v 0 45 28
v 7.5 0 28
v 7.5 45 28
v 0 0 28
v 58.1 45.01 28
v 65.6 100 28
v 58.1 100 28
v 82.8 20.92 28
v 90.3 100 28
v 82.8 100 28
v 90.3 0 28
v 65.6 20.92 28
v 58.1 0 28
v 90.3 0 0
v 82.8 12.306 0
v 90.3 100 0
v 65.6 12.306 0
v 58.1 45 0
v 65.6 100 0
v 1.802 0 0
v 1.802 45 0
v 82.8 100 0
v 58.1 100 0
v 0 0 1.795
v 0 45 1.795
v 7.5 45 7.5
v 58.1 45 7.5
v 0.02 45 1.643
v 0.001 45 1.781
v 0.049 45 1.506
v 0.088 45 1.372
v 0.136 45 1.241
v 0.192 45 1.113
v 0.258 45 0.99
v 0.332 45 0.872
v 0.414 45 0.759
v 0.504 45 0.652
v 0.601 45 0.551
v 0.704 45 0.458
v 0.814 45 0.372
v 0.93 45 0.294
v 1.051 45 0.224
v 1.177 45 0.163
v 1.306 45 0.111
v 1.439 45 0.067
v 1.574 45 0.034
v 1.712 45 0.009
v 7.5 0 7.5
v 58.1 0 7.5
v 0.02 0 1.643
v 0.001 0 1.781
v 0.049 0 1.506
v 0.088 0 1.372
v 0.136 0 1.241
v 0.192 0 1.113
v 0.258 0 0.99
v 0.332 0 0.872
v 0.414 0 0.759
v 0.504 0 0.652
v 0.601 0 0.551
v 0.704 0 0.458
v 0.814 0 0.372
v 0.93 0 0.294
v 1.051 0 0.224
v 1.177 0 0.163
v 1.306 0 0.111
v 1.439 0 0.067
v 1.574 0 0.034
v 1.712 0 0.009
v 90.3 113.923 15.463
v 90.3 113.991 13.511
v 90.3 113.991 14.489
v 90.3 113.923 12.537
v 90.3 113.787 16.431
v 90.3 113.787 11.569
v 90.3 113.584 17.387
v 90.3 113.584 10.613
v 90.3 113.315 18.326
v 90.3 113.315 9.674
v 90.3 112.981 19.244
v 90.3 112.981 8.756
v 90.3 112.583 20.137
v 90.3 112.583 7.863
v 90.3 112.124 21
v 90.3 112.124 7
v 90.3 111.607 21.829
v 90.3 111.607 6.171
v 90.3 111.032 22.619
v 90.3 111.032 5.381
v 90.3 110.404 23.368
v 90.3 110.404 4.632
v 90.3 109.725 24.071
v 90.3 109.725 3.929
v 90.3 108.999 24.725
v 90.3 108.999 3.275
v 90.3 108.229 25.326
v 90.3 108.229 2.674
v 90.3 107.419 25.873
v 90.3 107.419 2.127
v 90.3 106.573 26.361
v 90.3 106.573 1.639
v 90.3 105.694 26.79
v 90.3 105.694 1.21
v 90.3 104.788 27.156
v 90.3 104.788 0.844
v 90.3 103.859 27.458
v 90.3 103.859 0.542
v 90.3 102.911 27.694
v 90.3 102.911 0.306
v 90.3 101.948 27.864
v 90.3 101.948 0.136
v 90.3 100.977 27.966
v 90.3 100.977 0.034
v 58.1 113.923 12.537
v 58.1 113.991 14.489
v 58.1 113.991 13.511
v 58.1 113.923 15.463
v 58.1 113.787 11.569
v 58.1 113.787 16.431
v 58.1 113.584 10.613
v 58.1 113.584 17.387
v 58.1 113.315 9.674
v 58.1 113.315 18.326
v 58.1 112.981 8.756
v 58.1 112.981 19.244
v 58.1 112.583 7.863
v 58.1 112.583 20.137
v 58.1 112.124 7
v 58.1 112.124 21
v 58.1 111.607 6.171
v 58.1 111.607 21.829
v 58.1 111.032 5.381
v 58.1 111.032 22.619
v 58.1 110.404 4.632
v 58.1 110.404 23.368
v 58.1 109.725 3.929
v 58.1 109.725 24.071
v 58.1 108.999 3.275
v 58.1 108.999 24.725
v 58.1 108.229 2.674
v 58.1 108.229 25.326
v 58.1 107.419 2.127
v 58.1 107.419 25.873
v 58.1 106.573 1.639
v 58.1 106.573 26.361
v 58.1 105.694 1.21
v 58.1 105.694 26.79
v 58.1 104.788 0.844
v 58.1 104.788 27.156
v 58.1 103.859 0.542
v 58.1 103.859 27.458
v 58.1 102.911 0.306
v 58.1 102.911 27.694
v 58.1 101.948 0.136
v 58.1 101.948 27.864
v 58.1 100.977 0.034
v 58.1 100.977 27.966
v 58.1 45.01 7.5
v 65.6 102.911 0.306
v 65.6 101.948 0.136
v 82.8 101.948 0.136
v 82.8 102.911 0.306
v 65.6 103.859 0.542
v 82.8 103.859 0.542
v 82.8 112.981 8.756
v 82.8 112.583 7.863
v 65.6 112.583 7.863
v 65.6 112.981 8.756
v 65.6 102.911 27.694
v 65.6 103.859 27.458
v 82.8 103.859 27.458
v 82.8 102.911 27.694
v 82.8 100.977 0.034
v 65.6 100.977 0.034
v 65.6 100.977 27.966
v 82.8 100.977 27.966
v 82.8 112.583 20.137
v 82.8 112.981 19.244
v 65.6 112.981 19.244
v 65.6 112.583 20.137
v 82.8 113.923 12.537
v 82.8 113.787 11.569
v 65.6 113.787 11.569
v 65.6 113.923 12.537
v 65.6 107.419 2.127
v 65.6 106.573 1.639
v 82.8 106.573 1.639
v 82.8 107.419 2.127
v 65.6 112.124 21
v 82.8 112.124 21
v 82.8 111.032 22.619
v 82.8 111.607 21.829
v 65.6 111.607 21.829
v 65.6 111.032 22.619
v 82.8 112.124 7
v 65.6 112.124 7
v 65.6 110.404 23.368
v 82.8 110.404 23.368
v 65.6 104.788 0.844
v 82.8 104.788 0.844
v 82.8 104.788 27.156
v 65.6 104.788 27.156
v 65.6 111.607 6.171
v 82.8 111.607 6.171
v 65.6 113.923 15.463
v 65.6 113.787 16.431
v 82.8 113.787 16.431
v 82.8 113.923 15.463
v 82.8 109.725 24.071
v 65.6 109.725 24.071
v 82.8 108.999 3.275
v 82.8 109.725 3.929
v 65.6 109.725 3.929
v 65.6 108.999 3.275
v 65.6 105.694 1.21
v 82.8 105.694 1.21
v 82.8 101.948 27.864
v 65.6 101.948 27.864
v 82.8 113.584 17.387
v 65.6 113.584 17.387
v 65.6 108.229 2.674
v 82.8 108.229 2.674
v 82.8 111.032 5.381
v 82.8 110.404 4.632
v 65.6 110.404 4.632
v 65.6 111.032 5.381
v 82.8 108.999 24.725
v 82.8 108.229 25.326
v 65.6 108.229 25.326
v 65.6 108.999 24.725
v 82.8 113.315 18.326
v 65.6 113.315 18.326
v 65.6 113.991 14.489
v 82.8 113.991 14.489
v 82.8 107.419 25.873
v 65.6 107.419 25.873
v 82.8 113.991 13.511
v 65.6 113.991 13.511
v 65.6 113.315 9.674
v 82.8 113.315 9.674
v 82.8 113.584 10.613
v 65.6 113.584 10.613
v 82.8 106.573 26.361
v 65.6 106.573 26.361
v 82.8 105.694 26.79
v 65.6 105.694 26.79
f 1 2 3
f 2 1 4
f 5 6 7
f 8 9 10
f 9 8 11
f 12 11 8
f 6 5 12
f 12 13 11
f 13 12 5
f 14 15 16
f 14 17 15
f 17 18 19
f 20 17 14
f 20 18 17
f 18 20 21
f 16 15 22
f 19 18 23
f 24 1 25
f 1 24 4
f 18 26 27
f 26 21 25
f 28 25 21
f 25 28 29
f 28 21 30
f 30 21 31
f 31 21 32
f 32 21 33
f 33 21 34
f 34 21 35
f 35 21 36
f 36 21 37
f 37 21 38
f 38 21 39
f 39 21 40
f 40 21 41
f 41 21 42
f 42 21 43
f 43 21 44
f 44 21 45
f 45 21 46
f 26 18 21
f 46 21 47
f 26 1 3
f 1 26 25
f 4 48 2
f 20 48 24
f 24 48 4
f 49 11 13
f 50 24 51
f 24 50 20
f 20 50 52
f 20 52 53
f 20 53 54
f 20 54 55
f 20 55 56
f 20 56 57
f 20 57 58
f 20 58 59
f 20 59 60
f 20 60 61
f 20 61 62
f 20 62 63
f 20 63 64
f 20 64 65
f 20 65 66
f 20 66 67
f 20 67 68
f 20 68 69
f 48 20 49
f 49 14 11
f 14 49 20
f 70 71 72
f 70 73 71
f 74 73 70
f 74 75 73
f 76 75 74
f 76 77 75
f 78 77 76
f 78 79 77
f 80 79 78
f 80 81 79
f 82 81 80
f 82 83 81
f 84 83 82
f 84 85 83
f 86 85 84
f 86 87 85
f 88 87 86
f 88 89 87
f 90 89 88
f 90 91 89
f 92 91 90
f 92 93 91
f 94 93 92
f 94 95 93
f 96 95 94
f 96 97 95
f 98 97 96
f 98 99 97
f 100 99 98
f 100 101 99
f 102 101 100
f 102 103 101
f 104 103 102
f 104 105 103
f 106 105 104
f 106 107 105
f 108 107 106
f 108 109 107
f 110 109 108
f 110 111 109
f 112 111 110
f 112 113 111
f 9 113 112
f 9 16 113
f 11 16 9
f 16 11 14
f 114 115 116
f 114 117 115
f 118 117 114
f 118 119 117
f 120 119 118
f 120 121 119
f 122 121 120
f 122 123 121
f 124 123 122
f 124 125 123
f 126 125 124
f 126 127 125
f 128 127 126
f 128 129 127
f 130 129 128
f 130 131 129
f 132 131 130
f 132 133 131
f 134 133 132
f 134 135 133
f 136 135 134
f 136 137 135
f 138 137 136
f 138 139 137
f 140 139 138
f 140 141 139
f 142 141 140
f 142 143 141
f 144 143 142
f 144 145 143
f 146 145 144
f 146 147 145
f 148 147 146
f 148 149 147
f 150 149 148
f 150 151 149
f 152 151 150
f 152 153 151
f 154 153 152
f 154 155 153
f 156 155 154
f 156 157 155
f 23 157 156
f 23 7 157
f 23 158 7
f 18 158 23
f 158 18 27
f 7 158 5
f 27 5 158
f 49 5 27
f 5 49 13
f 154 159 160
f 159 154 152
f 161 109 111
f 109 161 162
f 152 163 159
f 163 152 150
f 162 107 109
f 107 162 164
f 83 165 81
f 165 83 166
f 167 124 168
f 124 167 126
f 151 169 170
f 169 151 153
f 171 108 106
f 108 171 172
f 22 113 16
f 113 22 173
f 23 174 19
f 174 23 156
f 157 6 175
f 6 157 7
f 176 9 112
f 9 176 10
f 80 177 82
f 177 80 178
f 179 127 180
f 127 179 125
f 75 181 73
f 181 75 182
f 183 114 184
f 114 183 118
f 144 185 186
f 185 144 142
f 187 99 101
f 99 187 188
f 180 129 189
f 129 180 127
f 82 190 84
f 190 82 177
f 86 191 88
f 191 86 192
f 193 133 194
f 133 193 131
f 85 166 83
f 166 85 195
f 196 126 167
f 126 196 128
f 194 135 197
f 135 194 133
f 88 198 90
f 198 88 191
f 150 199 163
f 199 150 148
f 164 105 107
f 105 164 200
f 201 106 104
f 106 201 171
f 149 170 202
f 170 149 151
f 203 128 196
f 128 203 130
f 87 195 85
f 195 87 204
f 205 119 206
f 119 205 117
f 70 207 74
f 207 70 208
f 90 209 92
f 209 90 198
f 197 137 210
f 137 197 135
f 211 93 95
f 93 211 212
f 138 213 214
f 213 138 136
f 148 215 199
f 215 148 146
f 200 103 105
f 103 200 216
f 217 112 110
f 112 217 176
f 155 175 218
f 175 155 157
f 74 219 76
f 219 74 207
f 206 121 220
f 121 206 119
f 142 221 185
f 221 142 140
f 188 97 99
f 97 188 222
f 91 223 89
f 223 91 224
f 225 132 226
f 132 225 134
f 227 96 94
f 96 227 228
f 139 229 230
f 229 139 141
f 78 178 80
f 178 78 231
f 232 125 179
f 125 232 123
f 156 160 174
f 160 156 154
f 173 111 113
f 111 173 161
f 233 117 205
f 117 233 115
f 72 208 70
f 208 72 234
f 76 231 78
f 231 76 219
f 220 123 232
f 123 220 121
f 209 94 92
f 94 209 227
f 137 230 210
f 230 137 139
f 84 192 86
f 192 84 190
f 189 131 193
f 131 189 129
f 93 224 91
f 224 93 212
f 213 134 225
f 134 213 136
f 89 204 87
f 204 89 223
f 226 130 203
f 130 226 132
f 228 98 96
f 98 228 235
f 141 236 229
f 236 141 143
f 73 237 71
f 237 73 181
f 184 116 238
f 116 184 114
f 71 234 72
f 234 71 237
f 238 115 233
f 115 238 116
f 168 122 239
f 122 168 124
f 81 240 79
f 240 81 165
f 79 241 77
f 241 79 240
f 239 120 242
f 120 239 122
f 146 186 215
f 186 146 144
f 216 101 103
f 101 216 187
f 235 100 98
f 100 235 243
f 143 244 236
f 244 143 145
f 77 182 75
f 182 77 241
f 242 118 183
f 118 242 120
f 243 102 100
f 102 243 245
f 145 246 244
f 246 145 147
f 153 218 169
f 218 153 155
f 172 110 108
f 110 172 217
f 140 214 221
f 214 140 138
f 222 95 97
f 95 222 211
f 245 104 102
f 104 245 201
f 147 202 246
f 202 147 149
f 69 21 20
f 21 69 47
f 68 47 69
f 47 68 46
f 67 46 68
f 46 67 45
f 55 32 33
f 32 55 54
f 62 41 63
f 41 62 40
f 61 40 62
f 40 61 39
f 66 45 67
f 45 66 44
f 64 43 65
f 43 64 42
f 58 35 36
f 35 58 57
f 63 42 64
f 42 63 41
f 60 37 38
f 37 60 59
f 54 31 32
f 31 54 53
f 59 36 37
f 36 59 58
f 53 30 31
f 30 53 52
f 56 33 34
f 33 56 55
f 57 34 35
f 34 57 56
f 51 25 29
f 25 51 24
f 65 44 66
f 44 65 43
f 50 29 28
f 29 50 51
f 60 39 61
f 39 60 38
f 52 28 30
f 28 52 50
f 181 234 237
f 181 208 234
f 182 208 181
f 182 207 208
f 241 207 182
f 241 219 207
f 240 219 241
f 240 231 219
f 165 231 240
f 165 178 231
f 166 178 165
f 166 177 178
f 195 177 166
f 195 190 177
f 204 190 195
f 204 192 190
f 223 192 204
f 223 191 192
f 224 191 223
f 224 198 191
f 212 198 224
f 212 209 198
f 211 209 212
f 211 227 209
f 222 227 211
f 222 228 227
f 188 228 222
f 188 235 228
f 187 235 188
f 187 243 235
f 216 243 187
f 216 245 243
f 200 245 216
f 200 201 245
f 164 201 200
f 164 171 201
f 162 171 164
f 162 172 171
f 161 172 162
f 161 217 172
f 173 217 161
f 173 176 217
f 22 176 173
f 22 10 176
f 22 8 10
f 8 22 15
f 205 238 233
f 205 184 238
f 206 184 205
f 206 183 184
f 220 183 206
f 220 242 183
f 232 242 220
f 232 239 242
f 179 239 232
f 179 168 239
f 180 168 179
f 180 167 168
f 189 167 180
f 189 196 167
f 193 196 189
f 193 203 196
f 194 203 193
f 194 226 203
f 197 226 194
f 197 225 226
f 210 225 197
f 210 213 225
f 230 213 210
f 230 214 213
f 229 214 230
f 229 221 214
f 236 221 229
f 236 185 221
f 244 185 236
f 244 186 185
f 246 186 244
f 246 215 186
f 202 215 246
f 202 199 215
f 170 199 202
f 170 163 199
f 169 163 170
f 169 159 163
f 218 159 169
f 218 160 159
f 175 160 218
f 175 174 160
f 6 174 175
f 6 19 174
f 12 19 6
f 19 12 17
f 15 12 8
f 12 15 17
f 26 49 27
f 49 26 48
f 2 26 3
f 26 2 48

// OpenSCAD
$fa=4; // default minimum facet angle is now 0.5
$fs=0.05; // default minimum facet size is now 0.05 mm

wallThickness = 7.5;
legThickness = 20.5;
legWidth = 50.6;
legGroundAngle=72.9;

laptopThickness = 16.2;
laptopGap = 1;

bracketHeight = 45;
prongLength = 100;

difference() {
  union() {
    cube([legWidth + wallThickness * 2, bracketHeight, legThickness + wallThickness]);
    translate([legWidth + wallThickness, 0, 0]) cube([wallThickness * 2 + laptopGap + laptopThickness, prongLength, legThickness + wallThickness]);
    translate([legWidth + wallThickness, prongLength, (legThickness + wallThickness) / 2]) rotate([0, 90, 0]) cylinder(r = (legThickness + wallThickness) / 2, h = wallThickness * 2 + laptopGap + laptopThickness);
  }
  translate([legWidth + wallThickness * 2, 0, -40]) rotate([-(90 - legGroundAngle), 0, 0]) cube([laptopThickness + laptopGap, 100, 100]);

  translate([wallThickness, -.01, wallThickness]) cube([legWidth, bracketHeight + .02, legThickness + .01]);
  translate([1.99, -.01, 1.99]) rotate([90, 90, 180]) fillet(2, bracketHeight + .02);
}

module fillet(r, l) {
  difference() {
    cube([r, r, l]);
    translate([0, 0, -.1]) cylinder(h = l + .2, r = r);
  }
}
